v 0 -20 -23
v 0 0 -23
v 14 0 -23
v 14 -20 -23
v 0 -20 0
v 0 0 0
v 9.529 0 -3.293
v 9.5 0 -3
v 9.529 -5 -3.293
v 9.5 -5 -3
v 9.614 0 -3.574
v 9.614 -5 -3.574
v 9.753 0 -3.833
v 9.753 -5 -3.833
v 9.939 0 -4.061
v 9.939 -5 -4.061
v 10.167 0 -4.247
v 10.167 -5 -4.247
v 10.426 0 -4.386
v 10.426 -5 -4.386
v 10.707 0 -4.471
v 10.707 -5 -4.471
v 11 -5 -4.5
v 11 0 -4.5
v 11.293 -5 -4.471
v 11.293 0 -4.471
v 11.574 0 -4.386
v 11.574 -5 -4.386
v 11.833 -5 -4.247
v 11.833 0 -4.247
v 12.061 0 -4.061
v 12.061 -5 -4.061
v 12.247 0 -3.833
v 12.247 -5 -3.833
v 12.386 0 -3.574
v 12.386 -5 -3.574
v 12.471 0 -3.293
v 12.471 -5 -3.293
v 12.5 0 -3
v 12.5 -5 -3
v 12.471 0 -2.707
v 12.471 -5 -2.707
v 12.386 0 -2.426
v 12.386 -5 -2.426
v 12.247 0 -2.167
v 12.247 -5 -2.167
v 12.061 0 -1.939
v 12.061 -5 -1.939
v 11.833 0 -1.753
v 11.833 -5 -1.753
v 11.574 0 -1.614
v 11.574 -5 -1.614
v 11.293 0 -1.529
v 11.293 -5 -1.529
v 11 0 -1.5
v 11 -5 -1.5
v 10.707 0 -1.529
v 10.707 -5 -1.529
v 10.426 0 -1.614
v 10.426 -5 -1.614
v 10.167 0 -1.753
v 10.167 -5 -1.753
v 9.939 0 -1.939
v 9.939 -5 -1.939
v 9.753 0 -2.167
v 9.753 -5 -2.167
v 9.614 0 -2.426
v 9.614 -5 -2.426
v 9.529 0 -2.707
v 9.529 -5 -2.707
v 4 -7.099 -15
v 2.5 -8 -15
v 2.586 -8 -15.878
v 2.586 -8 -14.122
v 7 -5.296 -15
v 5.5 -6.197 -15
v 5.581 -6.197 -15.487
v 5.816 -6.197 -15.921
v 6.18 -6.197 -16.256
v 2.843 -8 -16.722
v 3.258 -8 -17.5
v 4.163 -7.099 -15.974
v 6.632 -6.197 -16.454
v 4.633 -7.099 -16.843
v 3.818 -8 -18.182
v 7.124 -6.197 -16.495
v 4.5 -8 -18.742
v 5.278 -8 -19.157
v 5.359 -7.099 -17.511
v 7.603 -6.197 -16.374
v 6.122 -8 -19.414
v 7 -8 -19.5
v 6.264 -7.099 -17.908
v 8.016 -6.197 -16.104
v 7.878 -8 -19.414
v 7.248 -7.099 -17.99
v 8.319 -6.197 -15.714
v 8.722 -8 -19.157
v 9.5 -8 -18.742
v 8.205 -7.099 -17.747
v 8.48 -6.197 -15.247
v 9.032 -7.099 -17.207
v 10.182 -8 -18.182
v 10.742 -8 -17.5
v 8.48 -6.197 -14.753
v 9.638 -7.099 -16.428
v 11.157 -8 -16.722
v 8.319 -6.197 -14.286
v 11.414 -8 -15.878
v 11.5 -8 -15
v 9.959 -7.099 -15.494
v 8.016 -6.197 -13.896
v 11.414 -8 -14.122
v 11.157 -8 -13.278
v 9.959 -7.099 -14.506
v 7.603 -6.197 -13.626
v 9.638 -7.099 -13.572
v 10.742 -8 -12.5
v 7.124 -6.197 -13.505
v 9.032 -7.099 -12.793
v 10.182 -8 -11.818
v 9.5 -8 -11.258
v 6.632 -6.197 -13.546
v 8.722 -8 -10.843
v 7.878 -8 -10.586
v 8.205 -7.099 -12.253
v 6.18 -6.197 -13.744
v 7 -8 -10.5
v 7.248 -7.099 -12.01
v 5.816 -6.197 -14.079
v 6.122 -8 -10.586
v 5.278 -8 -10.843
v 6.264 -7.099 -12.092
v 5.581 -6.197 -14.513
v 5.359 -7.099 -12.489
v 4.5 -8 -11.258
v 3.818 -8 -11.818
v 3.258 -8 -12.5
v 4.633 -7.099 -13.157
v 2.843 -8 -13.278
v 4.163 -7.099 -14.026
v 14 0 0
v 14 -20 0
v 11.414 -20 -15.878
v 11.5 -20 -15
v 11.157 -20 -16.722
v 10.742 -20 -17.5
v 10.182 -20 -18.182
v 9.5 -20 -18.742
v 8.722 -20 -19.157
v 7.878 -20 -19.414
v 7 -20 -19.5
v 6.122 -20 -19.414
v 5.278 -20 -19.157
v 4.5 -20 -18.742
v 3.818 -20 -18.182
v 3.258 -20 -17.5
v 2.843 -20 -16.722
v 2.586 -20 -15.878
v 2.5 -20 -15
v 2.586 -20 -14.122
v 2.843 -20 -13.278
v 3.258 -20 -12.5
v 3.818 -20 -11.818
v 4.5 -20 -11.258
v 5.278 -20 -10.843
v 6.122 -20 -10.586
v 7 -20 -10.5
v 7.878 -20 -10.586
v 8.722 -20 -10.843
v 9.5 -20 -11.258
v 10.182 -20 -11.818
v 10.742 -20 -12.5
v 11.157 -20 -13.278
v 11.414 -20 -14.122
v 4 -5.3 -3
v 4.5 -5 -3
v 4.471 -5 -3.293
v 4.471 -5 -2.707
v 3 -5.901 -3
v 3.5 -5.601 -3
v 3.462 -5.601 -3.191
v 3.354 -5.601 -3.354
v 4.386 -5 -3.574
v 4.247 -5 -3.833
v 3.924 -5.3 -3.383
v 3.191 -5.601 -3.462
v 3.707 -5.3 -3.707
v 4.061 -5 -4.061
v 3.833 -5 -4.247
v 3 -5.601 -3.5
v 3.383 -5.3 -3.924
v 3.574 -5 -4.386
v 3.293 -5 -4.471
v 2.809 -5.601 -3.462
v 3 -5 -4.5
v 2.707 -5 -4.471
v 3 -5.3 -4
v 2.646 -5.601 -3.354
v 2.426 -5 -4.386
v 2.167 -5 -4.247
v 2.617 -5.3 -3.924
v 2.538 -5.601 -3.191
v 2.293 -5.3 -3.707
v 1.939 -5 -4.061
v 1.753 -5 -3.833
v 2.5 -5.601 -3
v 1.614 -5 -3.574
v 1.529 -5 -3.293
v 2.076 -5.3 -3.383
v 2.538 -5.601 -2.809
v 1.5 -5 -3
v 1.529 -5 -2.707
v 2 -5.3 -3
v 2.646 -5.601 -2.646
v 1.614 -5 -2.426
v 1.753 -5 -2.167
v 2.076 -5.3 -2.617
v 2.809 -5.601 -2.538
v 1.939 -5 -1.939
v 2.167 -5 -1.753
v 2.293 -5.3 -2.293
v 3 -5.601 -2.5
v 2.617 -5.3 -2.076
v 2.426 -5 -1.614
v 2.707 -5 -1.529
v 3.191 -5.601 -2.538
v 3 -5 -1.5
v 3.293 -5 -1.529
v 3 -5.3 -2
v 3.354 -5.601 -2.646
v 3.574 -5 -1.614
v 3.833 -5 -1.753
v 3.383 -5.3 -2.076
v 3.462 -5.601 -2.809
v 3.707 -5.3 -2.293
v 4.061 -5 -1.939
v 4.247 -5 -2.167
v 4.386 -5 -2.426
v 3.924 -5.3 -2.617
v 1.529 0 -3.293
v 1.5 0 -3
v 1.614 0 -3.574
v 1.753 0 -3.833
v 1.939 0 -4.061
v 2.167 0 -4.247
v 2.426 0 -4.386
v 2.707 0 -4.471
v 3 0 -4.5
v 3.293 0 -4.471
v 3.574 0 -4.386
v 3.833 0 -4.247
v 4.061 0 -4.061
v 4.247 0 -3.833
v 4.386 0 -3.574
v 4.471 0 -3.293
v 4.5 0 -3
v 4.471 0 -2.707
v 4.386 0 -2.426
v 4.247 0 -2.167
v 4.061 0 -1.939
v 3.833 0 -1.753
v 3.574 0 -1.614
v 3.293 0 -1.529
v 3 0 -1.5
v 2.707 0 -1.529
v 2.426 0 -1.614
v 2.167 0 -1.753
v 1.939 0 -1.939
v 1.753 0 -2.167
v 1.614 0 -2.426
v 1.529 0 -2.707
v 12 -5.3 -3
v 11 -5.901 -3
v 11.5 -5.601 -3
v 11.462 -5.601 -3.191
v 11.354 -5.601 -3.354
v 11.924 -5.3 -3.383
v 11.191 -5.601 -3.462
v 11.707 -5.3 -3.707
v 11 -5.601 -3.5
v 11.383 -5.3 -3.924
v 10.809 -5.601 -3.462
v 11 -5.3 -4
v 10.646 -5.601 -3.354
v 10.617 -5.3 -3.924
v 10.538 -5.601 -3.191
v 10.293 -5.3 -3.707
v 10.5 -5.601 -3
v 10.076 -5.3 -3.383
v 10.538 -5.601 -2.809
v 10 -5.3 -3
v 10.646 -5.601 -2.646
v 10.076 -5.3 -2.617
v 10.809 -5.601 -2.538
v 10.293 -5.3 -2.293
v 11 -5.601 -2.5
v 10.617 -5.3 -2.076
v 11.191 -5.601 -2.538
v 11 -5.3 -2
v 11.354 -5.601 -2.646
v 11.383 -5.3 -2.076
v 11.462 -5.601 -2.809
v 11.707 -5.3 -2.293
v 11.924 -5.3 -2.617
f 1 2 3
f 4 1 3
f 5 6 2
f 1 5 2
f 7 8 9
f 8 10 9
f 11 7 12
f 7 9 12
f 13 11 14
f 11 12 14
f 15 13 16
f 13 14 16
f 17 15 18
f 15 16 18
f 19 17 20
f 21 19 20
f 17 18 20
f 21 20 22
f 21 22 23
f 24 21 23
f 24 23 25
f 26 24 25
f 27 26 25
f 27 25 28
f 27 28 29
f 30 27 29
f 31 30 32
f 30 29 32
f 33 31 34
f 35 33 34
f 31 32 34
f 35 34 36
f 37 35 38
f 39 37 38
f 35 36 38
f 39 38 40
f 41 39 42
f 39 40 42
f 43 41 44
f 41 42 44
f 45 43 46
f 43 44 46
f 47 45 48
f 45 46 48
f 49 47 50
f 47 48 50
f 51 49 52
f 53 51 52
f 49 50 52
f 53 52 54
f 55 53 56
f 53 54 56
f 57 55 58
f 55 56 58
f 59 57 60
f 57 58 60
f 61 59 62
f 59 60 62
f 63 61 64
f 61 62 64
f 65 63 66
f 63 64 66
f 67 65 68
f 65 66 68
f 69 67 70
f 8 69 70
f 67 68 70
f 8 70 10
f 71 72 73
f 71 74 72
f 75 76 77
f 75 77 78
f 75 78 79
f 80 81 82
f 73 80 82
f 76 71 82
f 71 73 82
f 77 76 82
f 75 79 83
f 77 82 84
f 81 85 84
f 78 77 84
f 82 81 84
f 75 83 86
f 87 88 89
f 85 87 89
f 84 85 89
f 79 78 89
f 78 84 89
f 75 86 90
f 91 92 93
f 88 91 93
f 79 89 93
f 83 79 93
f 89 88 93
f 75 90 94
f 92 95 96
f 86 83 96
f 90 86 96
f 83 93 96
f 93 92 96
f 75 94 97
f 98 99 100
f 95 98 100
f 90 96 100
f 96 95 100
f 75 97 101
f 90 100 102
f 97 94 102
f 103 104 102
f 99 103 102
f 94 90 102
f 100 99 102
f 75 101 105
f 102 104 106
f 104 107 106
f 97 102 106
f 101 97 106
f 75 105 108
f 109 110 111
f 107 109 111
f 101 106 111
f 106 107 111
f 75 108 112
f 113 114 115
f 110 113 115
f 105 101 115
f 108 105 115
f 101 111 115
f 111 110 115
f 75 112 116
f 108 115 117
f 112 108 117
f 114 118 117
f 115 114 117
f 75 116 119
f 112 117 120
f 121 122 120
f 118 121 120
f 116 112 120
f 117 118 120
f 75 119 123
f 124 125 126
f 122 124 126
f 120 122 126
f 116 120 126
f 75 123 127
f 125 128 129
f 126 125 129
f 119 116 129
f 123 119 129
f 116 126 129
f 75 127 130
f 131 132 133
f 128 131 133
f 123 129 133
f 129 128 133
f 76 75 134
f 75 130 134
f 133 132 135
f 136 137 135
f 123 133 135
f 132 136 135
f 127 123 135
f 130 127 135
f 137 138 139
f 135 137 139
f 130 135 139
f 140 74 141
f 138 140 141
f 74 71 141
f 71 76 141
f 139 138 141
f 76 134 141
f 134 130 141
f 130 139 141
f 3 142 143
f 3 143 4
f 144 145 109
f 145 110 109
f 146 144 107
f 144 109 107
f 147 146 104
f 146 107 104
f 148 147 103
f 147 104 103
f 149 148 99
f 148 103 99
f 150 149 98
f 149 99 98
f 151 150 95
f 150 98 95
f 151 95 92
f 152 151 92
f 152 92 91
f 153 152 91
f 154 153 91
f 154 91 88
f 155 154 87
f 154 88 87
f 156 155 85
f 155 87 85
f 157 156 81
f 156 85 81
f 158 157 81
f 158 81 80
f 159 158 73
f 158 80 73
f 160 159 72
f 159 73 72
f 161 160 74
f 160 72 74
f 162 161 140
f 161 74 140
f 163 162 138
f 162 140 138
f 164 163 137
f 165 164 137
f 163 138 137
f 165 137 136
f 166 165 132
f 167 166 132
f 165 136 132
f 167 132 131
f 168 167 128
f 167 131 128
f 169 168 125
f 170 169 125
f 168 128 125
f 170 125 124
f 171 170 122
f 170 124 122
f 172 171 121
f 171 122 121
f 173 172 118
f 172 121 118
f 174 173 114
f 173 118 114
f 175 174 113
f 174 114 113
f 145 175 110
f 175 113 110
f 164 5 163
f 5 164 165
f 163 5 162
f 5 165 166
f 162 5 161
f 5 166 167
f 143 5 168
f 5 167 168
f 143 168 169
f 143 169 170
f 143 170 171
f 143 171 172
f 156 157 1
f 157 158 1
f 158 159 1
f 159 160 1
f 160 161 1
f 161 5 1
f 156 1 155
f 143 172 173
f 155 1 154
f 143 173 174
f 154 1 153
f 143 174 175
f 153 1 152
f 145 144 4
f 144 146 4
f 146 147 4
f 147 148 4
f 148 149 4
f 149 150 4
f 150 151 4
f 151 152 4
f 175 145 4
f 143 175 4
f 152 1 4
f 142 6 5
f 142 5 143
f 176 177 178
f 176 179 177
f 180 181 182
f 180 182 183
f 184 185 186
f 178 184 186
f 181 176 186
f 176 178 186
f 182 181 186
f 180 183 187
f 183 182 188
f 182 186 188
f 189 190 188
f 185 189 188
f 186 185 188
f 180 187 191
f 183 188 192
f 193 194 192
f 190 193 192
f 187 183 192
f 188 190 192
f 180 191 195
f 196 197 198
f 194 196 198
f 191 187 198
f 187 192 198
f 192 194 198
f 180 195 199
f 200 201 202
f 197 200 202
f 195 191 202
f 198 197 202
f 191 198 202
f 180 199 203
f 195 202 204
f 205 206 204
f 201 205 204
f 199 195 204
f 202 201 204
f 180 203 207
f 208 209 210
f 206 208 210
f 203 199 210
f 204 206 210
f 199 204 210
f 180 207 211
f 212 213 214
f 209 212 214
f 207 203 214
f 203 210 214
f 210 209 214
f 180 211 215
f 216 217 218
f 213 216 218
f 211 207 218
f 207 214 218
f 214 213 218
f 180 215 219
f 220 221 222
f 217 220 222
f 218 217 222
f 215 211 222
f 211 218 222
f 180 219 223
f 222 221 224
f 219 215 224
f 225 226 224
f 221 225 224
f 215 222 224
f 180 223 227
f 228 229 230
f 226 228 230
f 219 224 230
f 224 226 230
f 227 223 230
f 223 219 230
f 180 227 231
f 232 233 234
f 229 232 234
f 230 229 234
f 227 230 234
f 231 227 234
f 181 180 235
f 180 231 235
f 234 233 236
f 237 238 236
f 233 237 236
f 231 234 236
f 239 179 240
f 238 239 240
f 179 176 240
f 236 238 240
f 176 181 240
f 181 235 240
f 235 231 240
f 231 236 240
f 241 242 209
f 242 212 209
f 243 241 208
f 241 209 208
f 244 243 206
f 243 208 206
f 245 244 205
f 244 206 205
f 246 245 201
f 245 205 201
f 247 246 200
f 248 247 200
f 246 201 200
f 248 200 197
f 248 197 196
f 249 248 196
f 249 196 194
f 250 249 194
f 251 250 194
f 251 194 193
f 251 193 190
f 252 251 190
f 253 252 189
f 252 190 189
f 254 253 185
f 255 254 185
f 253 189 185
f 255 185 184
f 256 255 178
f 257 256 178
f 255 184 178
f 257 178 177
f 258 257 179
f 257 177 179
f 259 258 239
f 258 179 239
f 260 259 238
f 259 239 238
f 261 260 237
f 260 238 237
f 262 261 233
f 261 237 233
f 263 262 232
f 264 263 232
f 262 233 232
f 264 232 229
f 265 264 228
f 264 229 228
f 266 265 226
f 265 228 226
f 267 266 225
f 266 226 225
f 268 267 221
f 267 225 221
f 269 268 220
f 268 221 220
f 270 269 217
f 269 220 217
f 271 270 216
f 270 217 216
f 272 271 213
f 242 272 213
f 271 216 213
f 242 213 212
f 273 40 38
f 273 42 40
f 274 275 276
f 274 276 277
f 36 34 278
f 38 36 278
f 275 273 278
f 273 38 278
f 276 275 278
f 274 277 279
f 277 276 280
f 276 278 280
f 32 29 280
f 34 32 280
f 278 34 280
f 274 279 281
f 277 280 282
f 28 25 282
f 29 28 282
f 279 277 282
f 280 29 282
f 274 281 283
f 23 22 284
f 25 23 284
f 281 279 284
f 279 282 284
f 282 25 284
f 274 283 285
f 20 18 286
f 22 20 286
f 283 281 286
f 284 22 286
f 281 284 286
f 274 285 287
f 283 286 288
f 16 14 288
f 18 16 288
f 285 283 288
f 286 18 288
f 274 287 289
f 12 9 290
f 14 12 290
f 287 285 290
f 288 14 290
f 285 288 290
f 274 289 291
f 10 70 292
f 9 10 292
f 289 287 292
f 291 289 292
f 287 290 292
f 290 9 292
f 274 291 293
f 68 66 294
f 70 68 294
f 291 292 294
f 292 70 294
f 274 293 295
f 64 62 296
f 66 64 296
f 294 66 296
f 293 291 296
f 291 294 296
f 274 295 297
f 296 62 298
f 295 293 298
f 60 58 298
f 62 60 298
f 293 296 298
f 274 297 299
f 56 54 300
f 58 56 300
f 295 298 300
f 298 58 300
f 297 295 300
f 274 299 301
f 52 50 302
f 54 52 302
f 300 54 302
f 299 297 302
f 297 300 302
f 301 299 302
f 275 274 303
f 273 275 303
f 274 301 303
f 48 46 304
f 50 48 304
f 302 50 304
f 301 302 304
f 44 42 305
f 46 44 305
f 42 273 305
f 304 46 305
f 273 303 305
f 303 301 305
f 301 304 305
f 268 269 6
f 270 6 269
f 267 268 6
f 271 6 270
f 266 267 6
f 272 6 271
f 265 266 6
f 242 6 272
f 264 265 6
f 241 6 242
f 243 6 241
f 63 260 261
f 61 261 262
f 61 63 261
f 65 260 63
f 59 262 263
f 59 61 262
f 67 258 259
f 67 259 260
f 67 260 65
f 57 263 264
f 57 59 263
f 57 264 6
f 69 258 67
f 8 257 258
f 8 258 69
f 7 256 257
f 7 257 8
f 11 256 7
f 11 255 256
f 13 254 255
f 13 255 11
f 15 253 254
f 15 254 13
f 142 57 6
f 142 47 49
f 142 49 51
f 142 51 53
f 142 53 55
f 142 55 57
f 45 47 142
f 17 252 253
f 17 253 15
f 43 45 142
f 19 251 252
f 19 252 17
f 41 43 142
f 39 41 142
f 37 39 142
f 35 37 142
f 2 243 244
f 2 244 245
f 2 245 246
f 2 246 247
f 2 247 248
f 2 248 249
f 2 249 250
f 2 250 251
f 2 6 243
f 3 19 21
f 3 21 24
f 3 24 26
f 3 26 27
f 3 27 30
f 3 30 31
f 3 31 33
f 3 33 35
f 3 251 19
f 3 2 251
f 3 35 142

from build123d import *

# Parameters (mm, degrees)
SKETCH1_W                  = 14
SKETCH1_H                  = 23
BOSS_EXTRUDE1_DEPTH        = 20
F_3_0MM_DOWEL_HOLE1_D      = 3
F_3_0MM_DOWEL_HOLE1_DEPTH  = 5
F_3_0MM_DOWEL_HOLE1_TIP    = 0.901290929
M10X1_0_TAPPED_HOLE1_D     = 9
M10X1_0_TAPPED_HOLE1_DEPTH = 12
M10X1_0_TAPPED_HOLE1_TIP   = 2.703872786


with BuildPart() as part:
    # Sketch1 → Boss-Extrude1 (new body)
    with BuildSketch(Plane(origin=(0, 0, 0), x_dir=(1, 0, 0), z_dir=(0, 1, 0))):
        with Locations((7, 11.5)):
            Rectangle(SKETCH1_W, SKETCH1_H)
    extrude(amount=-BOSS_EXTRUDE1_DEPTH)

    # Ø3.0mm Dowel Hole1
    with Locations(Plane(origin=(0, 0, 0), x_dir=(1, 0, 0), z_dir=(0, 1, 0))):
        with Locations((3, 3), (11, 3)):
            Hole(F_3_0MM_DOWEL_HOLE1_D / 2, depth=F_3_0MM_DOWEL_HOLE1_DEPTH)
            with Locations((0, 0, -(F_3_0MM_DOWEL_HOLE1_DEPTH + F_3_0MM_DOWEL_HOLE1_TIP / 2))):  # 118° drill point
                Cone(0, F_3_0MM_DOWEL_HOLE1_D / 2, F_3_0MM_DOWEL_HOLE1_TIP, mode=Mode.SUBTRACT)

    # M10x1.0 Tapped Hole1
    with Locations(Plane(origin=(0, -20, 0), x_dir=(-1, 0, 0), z_dir=(0, -1, 0))):
        with Locations((-7, 15)):
            Hole(M10X1_0_TAPPED_HOLE1_D / 2, depth=M10X1_0_TAPPED_HOLE1_DEPTH)
            with Locations((0, 0, -(M10X1_0_TAPPED_HOLE1_DEPTH + M10X1_0_TAPPED_HOLE1_TIP / 2))):  # 118° drill point
                Cone(0, M10X1_0_TAPPED_HOLE1_D / 2, M10X1_0_TAPPED_HOLE1_TIP, mode=Mode.SUBTRACT)


solid = part.part
